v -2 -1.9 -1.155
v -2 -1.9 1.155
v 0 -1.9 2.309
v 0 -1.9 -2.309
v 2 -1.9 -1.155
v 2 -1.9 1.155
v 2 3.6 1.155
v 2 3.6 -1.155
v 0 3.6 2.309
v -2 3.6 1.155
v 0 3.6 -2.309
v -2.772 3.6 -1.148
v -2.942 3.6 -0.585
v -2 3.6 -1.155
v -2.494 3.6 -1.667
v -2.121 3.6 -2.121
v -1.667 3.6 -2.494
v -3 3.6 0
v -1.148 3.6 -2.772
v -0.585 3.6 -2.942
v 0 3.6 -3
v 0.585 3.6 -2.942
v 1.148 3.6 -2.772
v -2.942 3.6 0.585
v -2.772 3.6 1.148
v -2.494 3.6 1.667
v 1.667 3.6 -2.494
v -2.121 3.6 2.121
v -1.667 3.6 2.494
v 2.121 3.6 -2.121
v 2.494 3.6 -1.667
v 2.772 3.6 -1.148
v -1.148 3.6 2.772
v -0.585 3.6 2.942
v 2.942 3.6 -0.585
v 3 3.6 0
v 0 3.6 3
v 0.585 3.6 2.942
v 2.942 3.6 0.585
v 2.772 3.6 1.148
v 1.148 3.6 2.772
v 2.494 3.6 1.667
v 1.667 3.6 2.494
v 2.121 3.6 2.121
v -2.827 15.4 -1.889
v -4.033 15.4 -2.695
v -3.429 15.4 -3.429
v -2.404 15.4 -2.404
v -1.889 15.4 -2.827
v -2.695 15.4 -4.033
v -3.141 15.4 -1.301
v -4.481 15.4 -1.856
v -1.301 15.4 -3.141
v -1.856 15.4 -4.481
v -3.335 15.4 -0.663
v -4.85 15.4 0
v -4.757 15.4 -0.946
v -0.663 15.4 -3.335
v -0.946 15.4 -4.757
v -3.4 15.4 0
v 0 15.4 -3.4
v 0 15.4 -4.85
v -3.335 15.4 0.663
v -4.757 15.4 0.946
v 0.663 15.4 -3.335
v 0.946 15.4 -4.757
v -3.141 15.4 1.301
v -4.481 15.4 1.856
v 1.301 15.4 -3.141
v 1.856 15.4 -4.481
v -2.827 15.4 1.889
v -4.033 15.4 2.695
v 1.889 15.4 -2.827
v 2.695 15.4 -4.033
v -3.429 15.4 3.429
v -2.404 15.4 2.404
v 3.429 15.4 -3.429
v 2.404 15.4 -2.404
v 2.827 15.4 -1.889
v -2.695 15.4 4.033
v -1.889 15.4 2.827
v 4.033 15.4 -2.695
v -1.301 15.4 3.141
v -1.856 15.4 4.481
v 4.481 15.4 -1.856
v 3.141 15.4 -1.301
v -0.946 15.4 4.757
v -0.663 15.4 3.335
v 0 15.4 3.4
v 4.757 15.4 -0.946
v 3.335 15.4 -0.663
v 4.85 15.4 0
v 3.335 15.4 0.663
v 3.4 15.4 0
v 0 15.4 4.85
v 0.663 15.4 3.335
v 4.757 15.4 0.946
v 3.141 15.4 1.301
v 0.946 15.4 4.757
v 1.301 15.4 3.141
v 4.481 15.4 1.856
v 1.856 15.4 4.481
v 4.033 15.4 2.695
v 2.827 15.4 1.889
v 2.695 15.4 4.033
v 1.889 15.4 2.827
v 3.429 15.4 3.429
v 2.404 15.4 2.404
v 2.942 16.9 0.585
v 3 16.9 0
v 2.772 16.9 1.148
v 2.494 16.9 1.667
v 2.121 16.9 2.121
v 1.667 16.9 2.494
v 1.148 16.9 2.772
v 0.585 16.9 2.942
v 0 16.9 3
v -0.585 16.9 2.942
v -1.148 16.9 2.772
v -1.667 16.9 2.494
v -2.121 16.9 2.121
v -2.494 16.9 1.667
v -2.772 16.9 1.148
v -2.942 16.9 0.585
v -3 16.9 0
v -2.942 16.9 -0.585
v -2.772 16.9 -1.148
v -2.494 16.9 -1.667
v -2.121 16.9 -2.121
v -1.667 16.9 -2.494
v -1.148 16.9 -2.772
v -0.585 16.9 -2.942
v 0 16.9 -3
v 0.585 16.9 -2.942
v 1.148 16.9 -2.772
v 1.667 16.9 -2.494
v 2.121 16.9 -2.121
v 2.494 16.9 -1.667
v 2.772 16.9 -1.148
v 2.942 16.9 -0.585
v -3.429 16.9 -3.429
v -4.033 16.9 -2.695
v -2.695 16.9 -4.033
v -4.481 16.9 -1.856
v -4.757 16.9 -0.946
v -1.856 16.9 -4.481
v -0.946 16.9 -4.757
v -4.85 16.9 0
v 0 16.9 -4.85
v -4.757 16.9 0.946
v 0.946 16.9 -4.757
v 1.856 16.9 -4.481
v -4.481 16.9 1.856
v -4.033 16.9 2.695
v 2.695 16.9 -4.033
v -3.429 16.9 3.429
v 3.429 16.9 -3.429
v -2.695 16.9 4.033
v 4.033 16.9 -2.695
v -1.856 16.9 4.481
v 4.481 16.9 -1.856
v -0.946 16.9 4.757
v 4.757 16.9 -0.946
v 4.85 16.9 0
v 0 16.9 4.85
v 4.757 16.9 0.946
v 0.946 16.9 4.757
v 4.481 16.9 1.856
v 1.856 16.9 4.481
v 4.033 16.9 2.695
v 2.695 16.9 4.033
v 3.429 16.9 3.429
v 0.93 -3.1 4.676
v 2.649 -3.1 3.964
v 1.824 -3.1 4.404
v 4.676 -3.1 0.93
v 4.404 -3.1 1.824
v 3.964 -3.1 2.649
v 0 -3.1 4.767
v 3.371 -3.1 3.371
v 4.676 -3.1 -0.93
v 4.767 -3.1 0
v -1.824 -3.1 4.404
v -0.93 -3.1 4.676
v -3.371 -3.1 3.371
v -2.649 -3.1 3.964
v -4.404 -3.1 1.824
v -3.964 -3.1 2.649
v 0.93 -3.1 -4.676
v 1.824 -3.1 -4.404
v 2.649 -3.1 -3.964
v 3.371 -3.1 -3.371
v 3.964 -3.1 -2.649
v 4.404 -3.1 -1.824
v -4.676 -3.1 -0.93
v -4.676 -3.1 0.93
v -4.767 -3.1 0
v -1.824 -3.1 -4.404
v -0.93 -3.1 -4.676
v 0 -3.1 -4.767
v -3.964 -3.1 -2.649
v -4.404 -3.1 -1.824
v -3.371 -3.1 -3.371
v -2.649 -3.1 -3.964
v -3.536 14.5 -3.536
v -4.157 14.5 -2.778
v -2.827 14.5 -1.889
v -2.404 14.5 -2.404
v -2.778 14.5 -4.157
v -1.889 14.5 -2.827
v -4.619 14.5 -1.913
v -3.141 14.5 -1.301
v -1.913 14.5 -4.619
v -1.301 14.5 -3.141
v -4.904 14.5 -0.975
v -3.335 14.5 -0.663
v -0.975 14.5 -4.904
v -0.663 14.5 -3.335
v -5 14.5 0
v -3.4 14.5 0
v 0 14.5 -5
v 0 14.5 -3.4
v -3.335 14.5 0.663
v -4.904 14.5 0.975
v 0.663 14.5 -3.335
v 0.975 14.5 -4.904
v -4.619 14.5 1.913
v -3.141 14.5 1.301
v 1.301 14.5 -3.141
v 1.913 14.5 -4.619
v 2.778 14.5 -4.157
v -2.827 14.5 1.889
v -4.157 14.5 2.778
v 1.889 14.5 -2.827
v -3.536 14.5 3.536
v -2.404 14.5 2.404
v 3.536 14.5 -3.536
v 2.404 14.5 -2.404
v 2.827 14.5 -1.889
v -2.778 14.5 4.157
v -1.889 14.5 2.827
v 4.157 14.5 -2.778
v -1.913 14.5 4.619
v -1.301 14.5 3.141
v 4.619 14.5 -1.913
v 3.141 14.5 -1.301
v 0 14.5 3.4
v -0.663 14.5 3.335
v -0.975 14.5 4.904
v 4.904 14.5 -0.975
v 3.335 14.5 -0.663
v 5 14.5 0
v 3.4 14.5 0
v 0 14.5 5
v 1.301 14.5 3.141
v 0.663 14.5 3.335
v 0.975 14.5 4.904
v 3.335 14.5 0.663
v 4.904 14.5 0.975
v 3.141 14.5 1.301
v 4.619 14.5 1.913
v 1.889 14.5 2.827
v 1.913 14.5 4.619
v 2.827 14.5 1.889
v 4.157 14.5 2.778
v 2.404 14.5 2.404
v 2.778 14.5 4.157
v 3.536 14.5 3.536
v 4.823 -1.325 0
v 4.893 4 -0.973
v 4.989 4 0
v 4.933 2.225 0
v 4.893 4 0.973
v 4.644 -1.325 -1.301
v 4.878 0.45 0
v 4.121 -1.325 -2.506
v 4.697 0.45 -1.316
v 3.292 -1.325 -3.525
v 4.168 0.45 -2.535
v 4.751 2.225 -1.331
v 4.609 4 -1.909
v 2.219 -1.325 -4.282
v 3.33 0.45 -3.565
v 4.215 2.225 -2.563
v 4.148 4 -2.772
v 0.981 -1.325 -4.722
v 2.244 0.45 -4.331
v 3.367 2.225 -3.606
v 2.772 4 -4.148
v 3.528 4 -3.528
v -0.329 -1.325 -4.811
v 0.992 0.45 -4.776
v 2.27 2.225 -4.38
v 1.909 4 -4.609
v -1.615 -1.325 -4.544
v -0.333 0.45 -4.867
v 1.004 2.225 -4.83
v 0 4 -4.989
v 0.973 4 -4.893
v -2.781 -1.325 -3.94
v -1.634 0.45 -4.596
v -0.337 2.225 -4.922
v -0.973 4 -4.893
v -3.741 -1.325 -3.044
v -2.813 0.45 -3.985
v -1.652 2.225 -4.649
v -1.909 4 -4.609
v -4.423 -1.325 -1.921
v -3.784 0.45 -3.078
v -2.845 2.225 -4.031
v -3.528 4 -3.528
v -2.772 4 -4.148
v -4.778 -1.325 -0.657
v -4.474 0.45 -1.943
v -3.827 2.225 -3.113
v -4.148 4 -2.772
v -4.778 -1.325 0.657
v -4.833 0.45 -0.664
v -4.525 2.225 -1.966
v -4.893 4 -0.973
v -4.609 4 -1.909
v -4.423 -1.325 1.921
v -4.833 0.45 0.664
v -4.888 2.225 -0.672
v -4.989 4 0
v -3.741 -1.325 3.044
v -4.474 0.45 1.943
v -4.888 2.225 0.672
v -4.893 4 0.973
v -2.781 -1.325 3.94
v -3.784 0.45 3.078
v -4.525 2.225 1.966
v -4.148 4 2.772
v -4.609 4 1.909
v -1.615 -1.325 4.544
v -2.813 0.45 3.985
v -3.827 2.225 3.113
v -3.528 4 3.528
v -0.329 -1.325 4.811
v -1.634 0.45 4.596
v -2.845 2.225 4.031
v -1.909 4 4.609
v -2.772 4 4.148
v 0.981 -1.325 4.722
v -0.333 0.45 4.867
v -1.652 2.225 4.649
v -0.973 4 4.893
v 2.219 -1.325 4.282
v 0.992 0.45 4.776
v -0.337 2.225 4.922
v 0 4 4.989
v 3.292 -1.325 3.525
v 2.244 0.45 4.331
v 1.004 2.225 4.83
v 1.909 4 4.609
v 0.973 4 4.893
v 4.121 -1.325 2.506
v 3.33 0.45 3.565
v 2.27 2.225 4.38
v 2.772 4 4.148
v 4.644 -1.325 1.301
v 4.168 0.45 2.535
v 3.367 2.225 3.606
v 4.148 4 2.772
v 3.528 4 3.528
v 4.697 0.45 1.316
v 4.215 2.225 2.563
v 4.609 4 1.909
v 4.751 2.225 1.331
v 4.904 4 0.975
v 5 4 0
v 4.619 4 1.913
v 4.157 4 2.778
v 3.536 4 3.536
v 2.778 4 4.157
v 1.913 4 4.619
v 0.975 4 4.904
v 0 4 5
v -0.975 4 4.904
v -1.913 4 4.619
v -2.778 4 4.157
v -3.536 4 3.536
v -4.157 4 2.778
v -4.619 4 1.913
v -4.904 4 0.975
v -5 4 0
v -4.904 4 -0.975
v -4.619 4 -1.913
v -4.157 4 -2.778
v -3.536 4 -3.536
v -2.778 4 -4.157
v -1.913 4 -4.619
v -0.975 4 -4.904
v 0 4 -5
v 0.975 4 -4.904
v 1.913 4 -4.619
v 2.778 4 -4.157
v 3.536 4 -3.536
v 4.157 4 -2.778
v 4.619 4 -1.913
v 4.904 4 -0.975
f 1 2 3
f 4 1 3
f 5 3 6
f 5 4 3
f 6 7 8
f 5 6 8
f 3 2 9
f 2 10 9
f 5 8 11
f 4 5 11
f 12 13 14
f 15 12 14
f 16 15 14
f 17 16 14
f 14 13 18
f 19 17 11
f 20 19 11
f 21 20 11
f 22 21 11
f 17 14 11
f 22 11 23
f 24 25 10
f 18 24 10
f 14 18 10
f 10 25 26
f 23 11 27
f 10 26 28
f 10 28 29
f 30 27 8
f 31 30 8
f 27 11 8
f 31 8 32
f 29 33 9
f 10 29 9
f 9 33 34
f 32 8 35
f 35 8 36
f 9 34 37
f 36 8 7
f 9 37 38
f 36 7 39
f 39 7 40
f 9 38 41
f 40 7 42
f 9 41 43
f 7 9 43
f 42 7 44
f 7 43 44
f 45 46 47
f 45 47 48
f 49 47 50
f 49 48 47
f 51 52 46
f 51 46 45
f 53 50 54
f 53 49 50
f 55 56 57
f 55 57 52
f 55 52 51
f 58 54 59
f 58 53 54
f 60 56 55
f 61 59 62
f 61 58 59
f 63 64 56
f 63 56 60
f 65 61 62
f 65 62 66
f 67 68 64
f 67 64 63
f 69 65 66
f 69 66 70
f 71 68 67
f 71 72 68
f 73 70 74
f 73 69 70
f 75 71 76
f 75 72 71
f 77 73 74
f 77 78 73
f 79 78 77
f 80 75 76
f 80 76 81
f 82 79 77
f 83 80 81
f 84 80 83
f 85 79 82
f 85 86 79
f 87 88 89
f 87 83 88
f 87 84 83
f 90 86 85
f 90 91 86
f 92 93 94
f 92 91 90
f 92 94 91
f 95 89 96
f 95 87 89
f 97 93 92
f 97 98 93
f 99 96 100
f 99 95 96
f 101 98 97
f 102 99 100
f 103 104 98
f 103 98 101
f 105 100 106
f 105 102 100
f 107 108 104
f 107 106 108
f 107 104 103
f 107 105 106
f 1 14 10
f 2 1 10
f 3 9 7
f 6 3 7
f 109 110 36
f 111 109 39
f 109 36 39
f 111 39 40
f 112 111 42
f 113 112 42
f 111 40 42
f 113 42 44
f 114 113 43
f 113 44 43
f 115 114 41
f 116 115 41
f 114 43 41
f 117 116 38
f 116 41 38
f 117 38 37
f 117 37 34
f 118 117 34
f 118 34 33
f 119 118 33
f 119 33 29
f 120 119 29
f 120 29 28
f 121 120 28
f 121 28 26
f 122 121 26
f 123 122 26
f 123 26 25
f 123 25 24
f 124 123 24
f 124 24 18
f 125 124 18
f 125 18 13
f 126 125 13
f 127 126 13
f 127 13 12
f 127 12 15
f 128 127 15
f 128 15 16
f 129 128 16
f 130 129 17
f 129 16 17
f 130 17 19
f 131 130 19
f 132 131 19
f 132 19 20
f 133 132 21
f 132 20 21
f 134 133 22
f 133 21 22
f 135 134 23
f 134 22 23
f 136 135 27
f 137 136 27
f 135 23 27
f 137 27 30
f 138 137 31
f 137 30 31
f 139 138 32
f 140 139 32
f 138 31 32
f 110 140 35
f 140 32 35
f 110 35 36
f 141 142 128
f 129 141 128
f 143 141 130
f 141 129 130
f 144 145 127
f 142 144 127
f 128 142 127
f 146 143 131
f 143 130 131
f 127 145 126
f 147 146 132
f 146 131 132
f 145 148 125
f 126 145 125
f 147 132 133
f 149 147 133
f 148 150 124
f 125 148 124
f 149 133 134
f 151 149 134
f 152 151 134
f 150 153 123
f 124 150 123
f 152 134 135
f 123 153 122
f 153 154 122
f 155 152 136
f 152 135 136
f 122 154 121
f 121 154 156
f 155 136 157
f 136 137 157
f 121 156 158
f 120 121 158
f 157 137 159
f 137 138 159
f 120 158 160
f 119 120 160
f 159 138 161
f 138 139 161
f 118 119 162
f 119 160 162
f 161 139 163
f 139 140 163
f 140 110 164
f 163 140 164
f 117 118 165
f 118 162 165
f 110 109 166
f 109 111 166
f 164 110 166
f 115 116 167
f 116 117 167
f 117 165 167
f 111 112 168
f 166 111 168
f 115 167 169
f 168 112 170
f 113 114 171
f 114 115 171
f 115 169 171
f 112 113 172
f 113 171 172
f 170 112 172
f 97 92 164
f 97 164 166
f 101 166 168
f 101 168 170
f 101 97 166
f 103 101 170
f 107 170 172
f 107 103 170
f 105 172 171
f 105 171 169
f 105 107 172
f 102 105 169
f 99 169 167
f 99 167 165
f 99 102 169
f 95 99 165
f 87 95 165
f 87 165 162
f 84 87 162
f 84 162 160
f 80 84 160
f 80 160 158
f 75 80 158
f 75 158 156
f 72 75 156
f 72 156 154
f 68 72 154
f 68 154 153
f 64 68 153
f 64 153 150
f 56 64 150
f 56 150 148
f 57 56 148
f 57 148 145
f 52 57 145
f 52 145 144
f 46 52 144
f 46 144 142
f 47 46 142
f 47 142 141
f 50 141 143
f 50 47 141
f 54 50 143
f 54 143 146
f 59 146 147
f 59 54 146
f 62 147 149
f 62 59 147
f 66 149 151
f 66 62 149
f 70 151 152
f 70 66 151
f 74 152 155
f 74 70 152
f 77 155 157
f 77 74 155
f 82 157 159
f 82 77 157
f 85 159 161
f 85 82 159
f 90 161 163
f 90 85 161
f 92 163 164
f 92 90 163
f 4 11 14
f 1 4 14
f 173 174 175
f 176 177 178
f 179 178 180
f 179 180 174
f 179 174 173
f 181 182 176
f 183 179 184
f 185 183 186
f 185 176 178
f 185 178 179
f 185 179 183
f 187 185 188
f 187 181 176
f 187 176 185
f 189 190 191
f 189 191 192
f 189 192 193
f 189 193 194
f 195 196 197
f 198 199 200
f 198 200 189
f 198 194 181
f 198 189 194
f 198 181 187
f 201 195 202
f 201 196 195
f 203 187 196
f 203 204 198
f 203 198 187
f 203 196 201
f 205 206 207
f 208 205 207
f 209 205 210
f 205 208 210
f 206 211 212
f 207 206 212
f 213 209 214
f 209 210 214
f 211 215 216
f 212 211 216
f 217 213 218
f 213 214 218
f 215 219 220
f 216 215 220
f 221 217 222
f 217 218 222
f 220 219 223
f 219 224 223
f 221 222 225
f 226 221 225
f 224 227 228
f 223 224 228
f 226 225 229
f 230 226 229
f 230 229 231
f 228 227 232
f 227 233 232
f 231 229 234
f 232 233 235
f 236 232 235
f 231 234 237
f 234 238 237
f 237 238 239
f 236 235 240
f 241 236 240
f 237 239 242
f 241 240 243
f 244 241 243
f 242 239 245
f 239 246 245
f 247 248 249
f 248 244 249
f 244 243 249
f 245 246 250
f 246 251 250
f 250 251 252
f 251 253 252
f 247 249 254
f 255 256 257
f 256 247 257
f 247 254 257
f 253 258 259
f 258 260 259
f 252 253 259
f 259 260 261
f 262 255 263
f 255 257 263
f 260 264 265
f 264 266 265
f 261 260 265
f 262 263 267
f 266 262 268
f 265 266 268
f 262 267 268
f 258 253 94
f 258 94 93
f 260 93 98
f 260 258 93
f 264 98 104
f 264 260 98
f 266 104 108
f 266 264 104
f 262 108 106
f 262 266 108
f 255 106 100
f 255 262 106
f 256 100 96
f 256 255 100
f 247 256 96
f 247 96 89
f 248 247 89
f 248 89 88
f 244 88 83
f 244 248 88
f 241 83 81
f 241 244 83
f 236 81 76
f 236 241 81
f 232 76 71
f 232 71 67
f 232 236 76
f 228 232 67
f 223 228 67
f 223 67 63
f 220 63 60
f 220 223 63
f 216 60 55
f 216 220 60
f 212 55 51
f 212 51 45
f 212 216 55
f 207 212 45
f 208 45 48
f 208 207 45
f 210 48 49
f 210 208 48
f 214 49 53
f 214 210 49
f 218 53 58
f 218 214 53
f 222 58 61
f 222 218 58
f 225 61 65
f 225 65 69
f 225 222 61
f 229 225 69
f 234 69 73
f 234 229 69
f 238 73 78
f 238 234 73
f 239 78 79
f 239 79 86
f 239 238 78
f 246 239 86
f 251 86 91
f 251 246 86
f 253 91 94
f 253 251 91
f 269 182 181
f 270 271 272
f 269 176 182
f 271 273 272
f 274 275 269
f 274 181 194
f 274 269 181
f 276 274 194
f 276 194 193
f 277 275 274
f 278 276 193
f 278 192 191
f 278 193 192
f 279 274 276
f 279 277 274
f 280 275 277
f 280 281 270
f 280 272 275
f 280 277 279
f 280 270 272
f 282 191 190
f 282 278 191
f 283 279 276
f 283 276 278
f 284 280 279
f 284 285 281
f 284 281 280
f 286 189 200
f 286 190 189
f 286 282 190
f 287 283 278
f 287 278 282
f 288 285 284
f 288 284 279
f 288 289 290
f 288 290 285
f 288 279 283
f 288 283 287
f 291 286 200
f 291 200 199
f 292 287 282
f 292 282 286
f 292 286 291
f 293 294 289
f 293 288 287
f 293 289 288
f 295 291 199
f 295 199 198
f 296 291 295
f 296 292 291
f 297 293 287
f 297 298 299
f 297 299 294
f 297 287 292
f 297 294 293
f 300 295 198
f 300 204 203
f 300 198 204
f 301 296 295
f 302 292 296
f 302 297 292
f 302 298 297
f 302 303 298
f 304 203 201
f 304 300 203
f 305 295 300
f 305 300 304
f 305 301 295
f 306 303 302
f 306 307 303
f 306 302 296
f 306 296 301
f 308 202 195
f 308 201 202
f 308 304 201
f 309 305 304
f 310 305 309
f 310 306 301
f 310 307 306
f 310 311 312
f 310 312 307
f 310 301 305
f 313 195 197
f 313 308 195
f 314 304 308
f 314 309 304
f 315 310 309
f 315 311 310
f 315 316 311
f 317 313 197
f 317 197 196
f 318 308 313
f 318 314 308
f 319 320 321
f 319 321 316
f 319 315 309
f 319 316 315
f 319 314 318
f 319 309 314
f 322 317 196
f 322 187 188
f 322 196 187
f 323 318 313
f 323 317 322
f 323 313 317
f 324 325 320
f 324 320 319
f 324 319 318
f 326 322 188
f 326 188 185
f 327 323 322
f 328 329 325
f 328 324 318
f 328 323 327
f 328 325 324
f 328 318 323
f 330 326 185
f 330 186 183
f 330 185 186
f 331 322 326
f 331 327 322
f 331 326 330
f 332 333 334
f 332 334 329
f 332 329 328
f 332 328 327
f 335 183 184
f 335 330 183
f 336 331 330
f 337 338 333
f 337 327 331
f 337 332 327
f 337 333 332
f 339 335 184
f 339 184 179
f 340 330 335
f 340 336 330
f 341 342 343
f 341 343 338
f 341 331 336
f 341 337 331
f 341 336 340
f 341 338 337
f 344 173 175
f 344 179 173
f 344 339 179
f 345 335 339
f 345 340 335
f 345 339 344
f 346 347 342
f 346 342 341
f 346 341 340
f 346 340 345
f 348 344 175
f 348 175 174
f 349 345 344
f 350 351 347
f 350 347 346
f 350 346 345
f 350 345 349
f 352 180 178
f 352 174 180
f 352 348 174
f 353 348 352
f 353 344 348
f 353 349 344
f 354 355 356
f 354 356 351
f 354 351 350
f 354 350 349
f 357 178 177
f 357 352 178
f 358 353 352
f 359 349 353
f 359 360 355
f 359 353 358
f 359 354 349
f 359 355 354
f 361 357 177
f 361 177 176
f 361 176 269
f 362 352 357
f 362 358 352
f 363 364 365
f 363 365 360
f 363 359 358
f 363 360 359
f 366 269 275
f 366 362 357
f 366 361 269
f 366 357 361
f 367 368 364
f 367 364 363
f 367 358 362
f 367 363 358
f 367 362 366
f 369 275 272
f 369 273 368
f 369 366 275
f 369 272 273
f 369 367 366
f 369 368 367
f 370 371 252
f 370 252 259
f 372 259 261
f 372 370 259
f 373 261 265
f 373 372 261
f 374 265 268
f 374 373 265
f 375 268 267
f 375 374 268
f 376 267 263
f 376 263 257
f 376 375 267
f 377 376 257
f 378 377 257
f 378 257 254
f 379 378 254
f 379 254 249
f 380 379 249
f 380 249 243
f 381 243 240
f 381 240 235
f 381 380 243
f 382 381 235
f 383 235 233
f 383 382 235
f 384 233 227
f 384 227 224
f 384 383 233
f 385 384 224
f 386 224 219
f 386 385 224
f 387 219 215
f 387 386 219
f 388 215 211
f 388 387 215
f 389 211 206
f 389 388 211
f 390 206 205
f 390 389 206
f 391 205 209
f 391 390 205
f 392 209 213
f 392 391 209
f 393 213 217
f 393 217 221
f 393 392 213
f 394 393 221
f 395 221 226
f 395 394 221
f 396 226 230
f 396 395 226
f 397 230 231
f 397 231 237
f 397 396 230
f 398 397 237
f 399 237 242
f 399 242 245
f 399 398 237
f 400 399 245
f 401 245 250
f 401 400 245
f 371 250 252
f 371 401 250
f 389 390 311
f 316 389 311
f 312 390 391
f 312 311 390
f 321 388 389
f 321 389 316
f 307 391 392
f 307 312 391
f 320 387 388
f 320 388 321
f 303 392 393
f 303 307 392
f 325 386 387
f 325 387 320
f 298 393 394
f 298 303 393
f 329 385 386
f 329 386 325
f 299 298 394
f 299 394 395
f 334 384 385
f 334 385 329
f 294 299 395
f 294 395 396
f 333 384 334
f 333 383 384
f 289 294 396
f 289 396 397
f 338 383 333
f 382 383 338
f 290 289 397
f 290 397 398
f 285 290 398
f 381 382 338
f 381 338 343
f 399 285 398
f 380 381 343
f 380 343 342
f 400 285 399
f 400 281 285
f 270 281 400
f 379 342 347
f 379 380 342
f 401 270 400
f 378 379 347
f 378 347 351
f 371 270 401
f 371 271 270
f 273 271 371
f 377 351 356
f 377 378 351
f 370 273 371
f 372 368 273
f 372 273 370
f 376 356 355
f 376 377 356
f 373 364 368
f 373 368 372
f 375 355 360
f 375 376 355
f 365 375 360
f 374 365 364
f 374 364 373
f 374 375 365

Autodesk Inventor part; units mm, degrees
sketch "Sketch_1" plane through (0, 0, 0) normal (0, 0, 1) x (1, 0, 0)
  line L0 (0, -3.97) -> (0, 16.9)
  line L1 (0, 16.9) -> (4.85, 16.9)
  line L2 (4.85, 16.9) -> (4.85, 15.4)
  line L3 (4.85, 15.4) -> (3.4, 15.4)
  line L4 (3.4, 15.4) -> (3.4, 14.5)
  line L5 (3.4, 14.5) -> (5, 14.5)
  line L6 (5, 14.5) -> (5, 4)
  line L7 (5, 4) -> (4.9889, 4)
  line L8 (4.9889, 4) -> (4.7401, -3.97)
  line L9 (4.7401, -3.97) -> (0, -3.97)
  line L10 (0, -3.97) -> (0, 16.9)
revolve "Revolution1" add sketch "Sketch_1" angle 360 about axis through (0, -3.97, 0) along (0, -1, 0)
thread "Thread1" size "R 1/8" standard "ISO Taper" full length
sketch "_____1" plane through (0, 0, 0) normal (0, 0, 1) x (1, 0, 0)
  line L0 (-9.728, -3.1) -> (-9.728, -3.97)
  line L1 (-9.728, -3.97) -> (9.728, -3.97)
  line L2 (9.728, -3.97) -> (9.728, -3.1)
  line L3 (9.728, -3.1) -> (-9.728, -3.1)
extrude "Extrusion1" cut sketch "_____1" along normal mid plane 19.456
sketch "Sketch_2" plane through (0, 0, 0) normal (0, 0, 1) x (1, 0, 0)
  line L0 (0, 3.6) -> (0, 16.9)
  line L1 (0, 16.9) -> (3, 16.9)
  line L2 (3, 16.9) -> (3, 3.6)
  line L3 (3, 3.6) -> (0, 3.6)
  line L4 (0, 3.6) -> (0, 16.9)
revolve "Revolution2" cut sketch "Sketch_2" angle 360 about axis through (0, 3.6, 0) along (0, -1, 0)
sketch "Sketch_3" plane through (0, 16.9, 0) normal (0, 1, 0) x (1, 0, 0)
  line L0 (-2, -1.1547) -> (0, -2.3094)
  line L1 (0, -2.3094) -> (2, -1.1547)
  line L2 (2, -1.1547) -> (2, 1.1547)
  line L3 (2, 1.1547) -> (0, 2.3094)
  line L4 (0, 2.3094) -> (-2, 1.1547)
  line L5 (-2, 1.1547) -> (-2, -1.1547)
extrude "Extrusion2" cut sketch "Sketch_3" against normal blind 18.8
ref_plane "CNS_SCREW_XY" through (0, 0, 0) normal (0, 1, 0) x (1, 0, 0)
ref_plane "CNS_SCREW_YZ" through (0, 0, 0) normal (1, 0, 0) x (0, 0, -1)
ref_plane "CNS_SCREW_ZX" through (0, 0, 0) normal (0, 0, -1) x (0, 1, 0)
properties part number "KQ2S06-01AS (A) Brass"
